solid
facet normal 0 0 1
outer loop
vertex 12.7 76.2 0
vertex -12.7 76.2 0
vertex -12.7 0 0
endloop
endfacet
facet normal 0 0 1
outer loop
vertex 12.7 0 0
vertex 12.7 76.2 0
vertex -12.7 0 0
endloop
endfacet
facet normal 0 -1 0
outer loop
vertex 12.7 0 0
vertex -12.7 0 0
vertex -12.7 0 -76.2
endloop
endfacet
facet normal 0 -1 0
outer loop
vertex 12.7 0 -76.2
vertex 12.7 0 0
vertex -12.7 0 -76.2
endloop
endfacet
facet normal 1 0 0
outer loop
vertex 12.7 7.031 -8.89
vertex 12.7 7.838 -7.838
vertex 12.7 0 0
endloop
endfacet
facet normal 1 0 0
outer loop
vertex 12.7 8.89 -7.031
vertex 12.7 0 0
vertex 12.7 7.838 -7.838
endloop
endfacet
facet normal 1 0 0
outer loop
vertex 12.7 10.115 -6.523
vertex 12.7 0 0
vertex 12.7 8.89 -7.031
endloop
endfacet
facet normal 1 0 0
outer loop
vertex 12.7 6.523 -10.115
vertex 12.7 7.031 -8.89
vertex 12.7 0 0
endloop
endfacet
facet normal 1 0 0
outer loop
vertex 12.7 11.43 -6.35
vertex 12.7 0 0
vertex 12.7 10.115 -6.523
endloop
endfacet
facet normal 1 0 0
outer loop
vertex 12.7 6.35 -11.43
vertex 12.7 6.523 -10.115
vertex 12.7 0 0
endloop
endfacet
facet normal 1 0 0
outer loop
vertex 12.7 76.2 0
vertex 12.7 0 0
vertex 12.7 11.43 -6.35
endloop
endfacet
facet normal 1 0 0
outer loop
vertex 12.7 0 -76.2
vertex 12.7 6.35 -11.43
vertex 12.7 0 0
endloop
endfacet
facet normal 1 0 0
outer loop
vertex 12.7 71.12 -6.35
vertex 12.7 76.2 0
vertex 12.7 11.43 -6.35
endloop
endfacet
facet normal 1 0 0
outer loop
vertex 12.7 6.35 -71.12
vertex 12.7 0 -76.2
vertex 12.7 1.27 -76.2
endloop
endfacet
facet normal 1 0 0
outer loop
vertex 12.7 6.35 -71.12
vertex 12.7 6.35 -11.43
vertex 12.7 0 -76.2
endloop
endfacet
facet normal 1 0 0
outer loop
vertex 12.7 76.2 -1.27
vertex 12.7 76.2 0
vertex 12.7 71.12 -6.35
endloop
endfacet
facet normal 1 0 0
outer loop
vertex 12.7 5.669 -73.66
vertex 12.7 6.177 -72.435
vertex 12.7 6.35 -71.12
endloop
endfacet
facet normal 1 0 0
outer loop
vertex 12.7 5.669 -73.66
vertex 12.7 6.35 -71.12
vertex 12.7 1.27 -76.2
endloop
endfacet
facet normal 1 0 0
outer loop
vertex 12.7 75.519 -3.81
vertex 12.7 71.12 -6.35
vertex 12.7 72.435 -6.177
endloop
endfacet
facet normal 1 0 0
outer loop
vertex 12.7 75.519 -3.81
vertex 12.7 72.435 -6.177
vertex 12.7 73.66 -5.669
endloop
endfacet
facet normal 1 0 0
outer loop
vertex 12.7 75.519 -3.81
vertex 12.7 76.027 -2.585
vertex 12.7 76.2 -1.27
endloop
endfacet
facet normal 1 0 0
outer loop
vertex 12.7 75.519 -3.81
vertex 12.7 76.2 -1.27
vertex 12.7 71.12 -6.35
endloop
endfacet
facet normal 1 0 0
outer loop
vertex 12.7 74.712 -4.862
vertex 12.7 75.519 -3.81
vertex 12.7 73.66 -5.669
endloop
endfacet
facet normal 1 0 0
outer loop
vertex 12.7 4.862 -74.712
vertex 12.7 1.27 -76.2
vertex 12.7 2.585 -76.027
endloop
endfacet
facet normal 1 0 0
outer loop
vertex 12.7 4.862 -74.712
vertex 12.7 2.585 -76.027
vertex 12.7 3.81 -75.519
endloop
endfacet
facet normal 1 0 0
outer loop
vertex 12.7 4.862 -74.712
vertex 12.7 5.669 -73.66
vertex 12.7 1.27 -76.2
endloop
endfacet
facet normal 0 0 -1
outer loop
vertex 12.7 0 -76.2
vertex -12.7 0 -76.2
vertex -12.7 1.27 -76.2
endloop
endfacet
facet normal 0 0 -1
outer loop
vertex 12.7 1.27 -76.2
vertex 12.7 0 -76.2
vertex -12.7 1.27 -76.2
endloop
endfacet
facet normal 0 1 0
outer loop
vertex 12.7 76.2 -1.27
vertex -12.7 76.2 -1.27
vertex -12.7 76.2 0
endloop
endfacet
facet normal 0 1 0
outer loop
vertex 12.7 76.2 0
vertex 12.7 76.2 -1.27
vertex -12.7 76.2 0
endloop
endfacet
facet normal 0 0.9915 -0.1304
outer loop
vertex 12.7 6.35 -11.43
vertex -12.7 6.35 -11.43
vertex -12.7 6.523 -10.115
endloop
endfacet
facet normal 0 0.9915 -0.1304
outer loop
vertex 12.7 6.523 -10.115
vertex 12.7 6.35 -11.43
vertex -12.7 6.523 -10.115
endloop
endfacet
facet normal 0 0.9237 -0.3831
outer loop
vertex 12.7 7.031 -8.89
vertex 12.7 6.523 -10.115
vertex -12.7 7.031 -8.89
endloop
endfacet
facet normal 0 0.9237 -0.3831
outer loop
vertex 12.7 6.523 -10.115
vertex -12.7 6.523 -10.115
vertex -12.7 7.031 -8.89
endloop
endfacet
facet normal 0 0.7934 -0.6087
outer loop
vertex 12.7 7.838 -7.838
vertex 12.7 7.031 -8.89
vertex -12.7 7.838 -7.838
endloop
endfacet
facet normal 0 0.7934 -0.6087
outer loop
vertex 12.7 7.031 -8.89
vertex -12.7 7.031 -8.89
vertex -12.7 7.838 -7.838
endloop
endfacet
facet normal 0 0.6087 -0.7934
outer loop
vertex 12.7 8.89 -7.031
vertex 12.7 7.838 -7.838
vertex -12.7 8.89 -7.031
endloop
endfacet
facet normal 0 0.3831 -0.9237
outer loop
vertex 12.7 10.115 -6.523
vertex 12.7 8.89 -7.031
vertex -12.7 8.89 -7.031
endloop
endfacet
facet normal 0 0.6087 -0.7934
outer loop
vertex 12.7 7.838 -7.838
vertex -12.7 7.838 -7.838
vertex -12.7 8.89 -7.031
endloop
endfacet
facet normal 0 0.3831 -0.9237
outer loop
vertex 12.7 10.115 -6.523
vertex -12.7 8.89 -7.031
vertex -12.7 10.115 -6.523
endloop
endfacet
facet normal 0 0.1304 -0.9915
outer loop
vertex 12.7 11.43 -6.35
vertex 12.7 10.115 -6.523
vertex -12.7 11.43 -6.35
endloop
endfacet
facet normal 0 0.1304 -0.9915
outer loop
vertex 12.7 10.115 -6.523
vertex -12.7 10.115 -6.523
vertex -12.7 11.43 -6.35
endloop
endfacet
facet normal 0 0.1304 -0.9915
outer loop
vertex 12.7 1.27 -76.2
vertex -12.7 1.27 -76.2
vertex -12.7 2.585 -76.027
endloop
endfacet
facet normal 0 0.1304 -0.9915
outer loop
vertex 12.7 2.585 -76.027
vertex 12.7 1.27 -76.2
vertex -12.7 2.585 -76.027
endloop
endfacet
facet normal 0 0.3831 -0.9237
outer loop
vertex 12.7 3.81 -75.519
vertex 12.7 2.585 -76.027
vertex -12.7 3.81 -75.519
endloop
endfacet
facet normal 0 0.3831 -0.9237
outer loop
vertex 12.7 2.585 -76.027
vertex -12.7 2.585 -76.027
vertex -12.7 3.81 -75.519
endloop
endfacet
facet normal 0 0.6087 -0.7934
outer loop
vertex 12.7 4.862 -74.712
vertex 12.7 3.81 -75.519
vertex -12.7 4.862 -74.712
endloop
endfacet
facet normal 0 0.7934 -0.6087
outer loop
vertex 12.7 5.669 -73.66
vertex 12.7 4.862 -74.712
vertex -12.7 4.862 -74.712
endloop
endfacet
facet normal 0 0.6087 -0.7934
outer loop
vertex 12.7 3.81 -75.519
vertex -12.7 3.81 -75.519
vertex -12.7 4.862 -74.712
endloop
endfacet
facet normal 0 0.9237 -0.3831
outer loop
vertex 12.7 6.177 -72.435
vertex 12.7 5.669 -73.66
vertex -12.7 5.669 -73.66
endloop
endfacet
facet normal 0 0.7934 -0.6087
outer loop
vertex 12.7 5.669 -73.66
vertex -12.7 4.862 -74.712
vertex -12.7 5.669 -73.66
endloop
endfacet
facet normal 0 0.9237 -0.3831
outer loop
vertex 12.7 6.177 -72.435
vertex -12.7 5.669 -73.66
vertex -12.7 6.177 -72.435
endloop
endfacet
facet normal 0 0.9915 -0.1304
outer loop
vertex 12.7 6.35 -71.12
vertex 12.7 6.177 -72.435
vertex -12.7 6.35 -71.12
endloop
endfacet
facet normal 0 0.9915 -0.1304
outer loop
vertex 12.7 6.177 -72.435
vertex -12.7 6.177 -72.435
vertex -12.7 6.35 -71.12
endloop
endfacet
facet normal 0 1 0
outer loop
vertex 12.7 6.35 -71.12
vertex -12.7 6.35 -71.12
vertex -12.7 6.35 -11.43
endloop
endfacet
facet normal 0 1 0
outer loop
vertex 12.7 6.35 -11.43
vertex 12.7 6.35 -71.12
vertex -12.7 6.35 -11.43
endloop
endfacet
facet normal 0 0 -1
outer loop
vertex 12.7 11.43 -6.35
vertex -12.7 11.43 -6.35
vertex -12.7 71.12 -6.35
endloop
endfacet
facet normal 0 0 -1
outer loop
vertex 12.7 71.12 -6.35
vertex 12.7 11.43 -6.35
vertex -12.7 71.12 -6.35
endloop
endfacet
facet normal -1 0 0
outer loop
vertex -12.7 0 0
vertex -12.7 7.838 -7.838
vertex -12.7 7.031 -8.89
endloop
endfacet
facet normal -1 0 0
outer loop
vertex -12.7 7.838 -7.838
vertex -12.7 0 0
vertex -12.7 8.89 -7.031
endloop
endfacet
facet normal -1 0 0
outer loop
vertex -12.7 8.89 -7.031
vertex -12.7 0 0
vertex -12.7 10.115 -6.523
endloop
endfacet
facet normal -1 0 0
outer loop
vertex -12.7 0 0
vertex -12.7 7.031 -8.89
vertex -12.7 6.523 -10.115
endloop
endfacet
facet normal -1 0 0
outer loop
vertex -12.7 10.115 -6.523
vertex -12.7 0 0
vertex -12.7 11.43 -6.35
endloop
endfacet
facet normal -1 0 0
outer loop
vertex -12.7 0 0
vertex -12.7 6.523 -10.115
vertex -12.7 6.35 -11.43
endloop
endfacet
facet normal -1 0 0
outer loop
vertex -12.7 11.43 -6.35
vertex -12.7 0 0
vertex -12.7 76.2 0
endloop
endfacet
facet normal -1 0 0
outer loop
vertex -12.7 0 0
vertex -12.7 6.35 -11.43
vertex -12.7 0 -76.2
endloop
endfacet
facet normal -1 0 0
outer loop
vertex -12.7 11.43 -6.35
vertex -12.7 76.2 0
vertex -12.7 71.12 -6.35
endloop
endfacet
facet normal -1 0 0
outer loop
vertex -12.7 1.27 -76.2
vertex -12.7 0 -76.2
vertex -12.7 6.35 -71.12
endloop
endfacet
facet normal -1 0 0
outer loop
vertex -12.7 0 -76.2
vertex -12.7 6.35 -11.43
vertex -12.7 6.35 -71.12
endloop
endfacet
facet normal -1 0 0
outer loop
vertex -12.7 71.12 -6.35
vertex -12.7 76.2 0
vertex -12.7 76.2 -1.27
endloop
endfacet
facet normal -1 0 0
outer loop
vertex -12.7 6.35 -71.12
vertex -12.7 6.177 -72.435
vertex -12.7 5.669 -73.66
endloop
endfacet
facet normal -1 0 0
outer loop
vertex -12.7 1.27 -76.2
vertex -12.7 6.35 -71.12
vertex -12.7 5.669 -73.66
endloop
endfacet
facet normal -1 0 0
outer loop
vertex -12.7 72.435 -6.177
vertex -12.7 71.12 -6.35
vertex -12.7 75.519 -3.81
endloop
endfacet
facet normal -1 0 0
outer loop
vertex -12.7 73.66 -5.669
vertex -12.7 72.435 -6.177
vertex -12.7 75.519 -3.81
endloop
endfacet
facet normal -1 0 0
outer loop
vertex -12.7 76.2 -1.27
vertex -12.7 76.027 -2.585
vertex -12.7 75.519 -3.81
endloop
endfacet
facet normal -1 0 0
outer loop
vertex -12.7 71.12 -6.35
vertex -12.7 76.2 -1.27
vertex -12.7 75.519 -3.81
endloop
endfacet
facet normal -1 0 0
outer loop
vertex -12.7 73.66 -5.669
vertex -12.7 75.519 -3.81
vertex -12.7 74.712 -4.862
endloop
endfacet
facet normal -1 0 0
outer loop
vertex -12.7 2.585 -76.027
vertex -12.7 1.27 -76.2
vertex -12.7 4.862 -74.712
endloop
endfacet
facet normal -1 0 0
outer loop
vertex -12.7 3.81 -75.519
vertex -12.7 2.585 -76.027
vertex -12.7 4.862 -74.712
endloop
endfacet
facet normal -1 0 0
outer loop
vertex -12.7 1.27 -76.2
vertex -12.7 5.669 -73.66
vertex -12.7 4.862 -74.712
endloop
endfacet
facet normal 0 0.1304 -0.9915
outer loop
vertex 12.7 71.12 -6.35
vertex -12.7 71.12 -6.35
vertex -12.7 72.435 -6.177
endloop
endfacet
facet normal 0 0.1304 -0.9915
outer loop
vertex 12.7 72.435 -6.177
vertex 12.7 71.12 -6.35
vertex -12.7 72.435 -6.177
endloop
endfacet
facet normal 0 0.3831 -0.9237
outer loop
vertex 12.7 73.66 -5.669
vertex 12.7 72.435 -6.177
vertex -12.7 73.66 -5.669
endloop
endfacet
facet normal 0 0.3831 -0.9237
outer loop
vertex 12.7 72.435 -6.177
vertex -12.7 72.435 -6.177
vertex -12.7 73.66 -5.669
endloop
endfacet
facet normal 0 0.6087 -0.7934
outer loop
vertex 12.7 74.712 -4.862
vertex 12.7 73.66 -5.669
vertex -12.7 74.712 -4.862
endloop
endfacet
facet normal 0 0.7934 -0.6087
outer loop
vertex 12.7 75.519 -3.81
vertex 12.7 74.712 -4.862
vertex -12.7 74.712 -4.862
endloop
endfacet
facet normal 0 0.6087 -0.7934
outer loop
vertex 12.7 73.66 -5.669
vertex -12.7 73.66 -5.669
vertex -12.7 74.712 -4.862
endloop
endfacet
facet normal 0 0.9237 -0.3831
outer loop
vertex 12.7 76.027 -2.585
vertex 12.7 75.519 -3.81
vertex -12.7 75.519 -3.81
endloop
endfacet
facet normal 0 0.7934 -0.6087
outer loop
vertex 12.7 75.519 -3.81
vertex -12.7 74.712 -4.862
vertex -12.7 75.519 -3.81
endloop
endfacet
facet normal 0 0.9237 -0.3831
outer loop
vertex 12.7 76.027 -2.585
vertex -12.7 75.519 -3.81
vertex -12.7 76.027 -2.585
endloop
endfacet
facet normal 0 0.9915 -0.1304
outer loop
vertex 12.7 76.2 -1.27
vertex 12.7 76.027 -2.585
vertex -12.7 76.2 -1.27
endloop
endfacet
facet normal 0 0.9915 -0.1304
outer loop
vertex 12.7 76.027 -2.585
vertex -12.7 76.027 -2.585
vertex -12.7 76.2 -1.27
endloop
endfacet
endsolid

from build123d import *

# Parameters (mm, degrees)
BOSS_EXTRUDE1_DEPTH      = 12.7
BOSS_EXTRUDE1_DEPTH_BACK = 12.7


with BuildPart() as part:
    # Sketch1 → Boss-Extrude1 (new, two sides: drawn at the far end of the back side and taken through both)
    with BuildSketch(Plane(origin=(0, 0, 0), x_dir=(0, 0, -1), z_dir=(1, 0, 0)).offset(-BOSS_EXTRUDE1_DEPTH_BACK)):
        with BuildLine():
            Line((0, 76.2), (0, 0))
            Line((0, 0), (76.2, 0))
            Line((76.2, 0), (76.2, 1.27))
            ThreePointArc((76.2, 1.27), (74.712102448, 4.862102448), (71.12, 6.35))
            Line((71.12, 6.35), (11.43, 6.35))
            ThreePointArc((11.43, 6.35), (7.837897552, 7.837897552), (6.35, 11.43))
            Line((6.35, 11.43), (6.35, 71.12))
            ThreePointArc((6.35, 71.12), (4.862102448, 74.712102448), (1.27, 76.2))
            Line((1.27, 76.2), (0, 76.2))
        make_face()
    extrude(amount=BOSS_EXTRUDE1_DEPTH + BOSS_EXTRUDE1_DEPTH_BACK)


solid = part.part
